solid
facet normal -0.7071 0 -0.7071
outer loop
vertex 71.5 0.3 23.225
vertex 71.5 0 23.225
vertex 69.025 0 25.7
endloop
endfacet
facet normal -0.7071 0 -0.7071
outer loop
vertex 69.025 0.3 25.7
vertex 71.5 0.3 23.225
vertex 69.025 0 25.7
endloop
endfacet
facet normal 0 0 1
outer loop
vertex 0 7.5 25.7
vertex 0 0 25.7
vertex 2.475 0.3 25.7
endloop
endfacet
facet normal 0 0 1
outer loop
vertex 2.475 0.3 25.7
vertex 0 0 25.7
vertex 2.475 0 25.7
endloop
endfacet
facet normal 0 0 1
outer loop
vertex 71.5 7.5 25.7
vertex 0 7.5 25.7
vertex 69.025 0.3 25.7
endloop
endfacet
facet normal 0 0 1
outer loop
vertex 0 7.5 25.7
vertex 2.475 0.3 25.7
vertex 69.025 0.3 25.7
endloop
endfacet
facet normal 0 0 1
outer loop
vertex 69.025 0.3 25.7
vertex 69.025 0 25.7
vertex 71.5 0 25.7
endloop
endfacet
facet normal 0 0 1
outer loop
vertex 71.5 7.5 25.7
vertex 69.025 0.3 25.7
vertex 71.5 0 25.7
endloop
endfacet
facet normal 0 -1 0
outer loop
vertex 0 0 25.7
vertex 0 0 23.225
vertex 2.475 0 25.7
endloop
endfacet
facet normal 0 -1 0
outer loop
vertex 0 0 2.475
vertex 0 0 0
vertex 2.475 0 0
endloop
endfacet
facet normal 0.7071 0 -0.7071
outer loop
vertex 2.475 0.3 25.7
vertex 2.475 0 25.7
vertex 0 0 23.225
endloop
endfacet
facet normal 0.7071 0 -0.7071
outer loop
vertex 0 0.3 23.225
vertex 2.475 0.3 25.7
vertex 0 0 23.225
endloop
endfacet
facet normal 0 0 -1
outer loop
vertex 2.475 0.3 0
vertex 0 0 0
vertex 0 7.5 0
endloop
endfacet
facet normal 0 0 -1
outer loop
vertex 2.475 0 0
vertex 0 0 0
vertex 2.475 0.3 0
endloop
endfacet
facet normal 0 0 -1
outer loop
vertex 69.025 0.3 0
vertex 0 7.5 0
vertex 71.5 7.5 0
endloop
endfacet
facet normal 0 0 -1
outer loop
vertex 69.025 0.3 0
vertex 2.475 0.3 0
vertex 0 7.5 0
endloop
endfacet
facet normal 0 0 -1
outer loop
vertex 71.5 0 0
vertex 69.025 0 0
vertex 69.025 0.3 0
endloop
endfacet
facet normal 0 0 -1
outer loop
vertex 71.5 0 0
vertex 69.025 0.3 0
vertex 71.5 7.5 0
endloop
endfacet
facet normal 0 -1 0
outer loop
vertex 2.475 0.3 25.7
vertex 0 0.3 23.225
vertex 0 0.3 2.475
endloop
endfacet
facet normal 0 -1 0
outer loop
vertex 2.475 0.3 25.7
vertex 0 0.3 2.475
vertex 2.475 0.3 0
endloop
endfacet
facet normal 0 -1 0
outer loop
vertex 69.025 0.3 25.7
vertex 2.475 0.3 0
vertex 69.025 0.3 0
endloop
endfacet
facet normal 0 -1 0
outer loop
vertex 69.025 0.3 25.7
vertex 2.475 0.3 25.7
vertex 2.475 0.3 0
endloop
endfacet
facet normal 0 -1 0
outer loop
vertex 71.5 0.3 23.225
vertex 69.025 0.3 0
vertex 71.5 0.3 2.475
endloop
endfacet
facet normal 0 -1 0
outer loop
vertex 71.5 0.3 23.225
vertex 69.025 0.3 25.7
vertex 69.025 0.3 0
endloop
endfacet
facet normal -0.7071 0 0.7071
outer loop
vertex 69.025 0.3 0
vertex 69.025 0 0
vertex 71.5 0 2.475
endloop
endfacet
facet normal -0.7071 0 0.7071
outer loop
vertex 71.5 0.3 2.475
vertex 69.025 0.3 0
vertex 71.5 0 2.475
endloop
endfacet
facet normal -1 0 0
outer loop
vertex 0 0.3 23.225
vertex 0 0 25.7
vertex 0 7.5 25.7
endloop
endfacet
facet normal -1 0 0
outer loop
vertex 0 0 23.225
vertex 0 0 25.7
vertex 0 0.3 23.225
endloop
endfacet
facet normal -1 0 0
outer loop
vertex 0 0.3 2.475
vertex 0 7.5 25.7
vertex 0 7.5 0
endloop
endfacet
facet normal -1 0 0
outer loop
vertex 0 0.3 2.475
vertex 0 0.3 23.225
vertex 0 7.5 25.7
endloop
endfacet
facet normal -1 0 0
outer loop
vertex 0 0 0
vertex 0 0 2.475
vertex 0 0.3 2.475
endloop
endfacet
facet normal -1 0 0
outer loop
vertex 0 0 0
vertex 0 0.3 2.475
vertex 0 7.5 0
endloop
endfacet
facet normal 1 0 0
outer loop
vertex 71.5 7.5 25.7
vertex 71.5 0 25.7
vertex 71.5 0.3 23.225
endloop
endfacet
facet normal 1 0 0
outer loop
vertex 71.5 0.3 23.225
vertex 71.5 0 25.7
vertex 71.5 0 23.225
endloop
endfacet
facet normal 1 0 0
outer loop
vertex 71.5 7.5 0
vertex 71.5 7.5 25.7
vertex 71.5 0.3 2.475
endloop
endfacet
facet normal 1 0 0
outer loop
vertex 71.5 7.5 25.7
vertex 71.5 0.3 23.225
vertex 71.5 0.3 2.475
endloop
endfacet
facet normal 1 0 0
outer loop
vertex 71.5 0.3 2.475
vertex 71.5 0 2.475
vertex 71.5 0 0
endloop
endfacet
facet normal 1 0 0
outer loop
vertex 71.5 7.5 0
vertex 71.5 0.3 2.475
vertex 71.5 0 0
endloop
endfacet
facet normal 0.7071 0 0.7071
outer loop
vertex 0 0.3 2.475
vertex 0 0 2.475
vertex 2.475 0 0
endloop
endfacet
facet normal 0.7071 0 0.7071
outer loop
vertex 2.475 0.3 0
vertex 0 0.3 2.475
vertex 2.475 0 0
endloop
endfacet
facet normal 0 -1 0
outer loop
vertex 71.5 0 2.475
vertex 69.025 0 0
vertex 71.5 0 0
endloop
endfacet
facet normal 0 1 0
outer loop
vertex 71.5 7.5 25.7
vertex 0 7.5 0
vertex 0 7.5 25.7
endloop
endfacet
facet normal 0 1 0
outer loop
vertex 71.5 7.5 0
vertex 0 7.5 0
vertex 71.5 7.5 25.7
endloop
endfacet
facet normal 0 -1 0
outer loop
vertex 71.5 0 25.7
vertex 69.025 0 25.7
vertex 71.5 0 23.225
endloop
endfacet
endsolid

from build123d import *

# Parameters (mm, degrees)
SKETCH_1_W          = 71.5
SKETCH_1_H          = 25.7
EXTRUDE_1_DEPTH     = 7.5
CUT_EXTRUDE_1_DEPTH = 0.3


with BuildPart() as part:
    # 草图1 → 凸台-拉伸1 (new body)
    with BuildSketch(Plane(origin=(0, 0, 0), x_dir=(1, 0, 0), z_dir=(0, 1, 0))):
        with Locations((35.75, -12.85)):
            Rectangle(SKETCH_1_W, SKETCH_1_H)
    extrude(amount=EXTRUDE_1_DEPTH)

    # 草图2 → 切除-拉伸1 (cut)
    with BuildSketch(Plane.XZ):
        Polygon((69.025126266, 25.7), (2.474873734, 25.7), (0, 23.225126266), (0, 2.474873734), (2.474873734, 0), (69.025126266, 0), (71.5, 2.474873734), (71.5, 23.225126266), align=None)
    extrude(amount=-CUT_EXTRUDE_1_DEPTH, mode=Mode.SUBTRACT)


solid = part.part
